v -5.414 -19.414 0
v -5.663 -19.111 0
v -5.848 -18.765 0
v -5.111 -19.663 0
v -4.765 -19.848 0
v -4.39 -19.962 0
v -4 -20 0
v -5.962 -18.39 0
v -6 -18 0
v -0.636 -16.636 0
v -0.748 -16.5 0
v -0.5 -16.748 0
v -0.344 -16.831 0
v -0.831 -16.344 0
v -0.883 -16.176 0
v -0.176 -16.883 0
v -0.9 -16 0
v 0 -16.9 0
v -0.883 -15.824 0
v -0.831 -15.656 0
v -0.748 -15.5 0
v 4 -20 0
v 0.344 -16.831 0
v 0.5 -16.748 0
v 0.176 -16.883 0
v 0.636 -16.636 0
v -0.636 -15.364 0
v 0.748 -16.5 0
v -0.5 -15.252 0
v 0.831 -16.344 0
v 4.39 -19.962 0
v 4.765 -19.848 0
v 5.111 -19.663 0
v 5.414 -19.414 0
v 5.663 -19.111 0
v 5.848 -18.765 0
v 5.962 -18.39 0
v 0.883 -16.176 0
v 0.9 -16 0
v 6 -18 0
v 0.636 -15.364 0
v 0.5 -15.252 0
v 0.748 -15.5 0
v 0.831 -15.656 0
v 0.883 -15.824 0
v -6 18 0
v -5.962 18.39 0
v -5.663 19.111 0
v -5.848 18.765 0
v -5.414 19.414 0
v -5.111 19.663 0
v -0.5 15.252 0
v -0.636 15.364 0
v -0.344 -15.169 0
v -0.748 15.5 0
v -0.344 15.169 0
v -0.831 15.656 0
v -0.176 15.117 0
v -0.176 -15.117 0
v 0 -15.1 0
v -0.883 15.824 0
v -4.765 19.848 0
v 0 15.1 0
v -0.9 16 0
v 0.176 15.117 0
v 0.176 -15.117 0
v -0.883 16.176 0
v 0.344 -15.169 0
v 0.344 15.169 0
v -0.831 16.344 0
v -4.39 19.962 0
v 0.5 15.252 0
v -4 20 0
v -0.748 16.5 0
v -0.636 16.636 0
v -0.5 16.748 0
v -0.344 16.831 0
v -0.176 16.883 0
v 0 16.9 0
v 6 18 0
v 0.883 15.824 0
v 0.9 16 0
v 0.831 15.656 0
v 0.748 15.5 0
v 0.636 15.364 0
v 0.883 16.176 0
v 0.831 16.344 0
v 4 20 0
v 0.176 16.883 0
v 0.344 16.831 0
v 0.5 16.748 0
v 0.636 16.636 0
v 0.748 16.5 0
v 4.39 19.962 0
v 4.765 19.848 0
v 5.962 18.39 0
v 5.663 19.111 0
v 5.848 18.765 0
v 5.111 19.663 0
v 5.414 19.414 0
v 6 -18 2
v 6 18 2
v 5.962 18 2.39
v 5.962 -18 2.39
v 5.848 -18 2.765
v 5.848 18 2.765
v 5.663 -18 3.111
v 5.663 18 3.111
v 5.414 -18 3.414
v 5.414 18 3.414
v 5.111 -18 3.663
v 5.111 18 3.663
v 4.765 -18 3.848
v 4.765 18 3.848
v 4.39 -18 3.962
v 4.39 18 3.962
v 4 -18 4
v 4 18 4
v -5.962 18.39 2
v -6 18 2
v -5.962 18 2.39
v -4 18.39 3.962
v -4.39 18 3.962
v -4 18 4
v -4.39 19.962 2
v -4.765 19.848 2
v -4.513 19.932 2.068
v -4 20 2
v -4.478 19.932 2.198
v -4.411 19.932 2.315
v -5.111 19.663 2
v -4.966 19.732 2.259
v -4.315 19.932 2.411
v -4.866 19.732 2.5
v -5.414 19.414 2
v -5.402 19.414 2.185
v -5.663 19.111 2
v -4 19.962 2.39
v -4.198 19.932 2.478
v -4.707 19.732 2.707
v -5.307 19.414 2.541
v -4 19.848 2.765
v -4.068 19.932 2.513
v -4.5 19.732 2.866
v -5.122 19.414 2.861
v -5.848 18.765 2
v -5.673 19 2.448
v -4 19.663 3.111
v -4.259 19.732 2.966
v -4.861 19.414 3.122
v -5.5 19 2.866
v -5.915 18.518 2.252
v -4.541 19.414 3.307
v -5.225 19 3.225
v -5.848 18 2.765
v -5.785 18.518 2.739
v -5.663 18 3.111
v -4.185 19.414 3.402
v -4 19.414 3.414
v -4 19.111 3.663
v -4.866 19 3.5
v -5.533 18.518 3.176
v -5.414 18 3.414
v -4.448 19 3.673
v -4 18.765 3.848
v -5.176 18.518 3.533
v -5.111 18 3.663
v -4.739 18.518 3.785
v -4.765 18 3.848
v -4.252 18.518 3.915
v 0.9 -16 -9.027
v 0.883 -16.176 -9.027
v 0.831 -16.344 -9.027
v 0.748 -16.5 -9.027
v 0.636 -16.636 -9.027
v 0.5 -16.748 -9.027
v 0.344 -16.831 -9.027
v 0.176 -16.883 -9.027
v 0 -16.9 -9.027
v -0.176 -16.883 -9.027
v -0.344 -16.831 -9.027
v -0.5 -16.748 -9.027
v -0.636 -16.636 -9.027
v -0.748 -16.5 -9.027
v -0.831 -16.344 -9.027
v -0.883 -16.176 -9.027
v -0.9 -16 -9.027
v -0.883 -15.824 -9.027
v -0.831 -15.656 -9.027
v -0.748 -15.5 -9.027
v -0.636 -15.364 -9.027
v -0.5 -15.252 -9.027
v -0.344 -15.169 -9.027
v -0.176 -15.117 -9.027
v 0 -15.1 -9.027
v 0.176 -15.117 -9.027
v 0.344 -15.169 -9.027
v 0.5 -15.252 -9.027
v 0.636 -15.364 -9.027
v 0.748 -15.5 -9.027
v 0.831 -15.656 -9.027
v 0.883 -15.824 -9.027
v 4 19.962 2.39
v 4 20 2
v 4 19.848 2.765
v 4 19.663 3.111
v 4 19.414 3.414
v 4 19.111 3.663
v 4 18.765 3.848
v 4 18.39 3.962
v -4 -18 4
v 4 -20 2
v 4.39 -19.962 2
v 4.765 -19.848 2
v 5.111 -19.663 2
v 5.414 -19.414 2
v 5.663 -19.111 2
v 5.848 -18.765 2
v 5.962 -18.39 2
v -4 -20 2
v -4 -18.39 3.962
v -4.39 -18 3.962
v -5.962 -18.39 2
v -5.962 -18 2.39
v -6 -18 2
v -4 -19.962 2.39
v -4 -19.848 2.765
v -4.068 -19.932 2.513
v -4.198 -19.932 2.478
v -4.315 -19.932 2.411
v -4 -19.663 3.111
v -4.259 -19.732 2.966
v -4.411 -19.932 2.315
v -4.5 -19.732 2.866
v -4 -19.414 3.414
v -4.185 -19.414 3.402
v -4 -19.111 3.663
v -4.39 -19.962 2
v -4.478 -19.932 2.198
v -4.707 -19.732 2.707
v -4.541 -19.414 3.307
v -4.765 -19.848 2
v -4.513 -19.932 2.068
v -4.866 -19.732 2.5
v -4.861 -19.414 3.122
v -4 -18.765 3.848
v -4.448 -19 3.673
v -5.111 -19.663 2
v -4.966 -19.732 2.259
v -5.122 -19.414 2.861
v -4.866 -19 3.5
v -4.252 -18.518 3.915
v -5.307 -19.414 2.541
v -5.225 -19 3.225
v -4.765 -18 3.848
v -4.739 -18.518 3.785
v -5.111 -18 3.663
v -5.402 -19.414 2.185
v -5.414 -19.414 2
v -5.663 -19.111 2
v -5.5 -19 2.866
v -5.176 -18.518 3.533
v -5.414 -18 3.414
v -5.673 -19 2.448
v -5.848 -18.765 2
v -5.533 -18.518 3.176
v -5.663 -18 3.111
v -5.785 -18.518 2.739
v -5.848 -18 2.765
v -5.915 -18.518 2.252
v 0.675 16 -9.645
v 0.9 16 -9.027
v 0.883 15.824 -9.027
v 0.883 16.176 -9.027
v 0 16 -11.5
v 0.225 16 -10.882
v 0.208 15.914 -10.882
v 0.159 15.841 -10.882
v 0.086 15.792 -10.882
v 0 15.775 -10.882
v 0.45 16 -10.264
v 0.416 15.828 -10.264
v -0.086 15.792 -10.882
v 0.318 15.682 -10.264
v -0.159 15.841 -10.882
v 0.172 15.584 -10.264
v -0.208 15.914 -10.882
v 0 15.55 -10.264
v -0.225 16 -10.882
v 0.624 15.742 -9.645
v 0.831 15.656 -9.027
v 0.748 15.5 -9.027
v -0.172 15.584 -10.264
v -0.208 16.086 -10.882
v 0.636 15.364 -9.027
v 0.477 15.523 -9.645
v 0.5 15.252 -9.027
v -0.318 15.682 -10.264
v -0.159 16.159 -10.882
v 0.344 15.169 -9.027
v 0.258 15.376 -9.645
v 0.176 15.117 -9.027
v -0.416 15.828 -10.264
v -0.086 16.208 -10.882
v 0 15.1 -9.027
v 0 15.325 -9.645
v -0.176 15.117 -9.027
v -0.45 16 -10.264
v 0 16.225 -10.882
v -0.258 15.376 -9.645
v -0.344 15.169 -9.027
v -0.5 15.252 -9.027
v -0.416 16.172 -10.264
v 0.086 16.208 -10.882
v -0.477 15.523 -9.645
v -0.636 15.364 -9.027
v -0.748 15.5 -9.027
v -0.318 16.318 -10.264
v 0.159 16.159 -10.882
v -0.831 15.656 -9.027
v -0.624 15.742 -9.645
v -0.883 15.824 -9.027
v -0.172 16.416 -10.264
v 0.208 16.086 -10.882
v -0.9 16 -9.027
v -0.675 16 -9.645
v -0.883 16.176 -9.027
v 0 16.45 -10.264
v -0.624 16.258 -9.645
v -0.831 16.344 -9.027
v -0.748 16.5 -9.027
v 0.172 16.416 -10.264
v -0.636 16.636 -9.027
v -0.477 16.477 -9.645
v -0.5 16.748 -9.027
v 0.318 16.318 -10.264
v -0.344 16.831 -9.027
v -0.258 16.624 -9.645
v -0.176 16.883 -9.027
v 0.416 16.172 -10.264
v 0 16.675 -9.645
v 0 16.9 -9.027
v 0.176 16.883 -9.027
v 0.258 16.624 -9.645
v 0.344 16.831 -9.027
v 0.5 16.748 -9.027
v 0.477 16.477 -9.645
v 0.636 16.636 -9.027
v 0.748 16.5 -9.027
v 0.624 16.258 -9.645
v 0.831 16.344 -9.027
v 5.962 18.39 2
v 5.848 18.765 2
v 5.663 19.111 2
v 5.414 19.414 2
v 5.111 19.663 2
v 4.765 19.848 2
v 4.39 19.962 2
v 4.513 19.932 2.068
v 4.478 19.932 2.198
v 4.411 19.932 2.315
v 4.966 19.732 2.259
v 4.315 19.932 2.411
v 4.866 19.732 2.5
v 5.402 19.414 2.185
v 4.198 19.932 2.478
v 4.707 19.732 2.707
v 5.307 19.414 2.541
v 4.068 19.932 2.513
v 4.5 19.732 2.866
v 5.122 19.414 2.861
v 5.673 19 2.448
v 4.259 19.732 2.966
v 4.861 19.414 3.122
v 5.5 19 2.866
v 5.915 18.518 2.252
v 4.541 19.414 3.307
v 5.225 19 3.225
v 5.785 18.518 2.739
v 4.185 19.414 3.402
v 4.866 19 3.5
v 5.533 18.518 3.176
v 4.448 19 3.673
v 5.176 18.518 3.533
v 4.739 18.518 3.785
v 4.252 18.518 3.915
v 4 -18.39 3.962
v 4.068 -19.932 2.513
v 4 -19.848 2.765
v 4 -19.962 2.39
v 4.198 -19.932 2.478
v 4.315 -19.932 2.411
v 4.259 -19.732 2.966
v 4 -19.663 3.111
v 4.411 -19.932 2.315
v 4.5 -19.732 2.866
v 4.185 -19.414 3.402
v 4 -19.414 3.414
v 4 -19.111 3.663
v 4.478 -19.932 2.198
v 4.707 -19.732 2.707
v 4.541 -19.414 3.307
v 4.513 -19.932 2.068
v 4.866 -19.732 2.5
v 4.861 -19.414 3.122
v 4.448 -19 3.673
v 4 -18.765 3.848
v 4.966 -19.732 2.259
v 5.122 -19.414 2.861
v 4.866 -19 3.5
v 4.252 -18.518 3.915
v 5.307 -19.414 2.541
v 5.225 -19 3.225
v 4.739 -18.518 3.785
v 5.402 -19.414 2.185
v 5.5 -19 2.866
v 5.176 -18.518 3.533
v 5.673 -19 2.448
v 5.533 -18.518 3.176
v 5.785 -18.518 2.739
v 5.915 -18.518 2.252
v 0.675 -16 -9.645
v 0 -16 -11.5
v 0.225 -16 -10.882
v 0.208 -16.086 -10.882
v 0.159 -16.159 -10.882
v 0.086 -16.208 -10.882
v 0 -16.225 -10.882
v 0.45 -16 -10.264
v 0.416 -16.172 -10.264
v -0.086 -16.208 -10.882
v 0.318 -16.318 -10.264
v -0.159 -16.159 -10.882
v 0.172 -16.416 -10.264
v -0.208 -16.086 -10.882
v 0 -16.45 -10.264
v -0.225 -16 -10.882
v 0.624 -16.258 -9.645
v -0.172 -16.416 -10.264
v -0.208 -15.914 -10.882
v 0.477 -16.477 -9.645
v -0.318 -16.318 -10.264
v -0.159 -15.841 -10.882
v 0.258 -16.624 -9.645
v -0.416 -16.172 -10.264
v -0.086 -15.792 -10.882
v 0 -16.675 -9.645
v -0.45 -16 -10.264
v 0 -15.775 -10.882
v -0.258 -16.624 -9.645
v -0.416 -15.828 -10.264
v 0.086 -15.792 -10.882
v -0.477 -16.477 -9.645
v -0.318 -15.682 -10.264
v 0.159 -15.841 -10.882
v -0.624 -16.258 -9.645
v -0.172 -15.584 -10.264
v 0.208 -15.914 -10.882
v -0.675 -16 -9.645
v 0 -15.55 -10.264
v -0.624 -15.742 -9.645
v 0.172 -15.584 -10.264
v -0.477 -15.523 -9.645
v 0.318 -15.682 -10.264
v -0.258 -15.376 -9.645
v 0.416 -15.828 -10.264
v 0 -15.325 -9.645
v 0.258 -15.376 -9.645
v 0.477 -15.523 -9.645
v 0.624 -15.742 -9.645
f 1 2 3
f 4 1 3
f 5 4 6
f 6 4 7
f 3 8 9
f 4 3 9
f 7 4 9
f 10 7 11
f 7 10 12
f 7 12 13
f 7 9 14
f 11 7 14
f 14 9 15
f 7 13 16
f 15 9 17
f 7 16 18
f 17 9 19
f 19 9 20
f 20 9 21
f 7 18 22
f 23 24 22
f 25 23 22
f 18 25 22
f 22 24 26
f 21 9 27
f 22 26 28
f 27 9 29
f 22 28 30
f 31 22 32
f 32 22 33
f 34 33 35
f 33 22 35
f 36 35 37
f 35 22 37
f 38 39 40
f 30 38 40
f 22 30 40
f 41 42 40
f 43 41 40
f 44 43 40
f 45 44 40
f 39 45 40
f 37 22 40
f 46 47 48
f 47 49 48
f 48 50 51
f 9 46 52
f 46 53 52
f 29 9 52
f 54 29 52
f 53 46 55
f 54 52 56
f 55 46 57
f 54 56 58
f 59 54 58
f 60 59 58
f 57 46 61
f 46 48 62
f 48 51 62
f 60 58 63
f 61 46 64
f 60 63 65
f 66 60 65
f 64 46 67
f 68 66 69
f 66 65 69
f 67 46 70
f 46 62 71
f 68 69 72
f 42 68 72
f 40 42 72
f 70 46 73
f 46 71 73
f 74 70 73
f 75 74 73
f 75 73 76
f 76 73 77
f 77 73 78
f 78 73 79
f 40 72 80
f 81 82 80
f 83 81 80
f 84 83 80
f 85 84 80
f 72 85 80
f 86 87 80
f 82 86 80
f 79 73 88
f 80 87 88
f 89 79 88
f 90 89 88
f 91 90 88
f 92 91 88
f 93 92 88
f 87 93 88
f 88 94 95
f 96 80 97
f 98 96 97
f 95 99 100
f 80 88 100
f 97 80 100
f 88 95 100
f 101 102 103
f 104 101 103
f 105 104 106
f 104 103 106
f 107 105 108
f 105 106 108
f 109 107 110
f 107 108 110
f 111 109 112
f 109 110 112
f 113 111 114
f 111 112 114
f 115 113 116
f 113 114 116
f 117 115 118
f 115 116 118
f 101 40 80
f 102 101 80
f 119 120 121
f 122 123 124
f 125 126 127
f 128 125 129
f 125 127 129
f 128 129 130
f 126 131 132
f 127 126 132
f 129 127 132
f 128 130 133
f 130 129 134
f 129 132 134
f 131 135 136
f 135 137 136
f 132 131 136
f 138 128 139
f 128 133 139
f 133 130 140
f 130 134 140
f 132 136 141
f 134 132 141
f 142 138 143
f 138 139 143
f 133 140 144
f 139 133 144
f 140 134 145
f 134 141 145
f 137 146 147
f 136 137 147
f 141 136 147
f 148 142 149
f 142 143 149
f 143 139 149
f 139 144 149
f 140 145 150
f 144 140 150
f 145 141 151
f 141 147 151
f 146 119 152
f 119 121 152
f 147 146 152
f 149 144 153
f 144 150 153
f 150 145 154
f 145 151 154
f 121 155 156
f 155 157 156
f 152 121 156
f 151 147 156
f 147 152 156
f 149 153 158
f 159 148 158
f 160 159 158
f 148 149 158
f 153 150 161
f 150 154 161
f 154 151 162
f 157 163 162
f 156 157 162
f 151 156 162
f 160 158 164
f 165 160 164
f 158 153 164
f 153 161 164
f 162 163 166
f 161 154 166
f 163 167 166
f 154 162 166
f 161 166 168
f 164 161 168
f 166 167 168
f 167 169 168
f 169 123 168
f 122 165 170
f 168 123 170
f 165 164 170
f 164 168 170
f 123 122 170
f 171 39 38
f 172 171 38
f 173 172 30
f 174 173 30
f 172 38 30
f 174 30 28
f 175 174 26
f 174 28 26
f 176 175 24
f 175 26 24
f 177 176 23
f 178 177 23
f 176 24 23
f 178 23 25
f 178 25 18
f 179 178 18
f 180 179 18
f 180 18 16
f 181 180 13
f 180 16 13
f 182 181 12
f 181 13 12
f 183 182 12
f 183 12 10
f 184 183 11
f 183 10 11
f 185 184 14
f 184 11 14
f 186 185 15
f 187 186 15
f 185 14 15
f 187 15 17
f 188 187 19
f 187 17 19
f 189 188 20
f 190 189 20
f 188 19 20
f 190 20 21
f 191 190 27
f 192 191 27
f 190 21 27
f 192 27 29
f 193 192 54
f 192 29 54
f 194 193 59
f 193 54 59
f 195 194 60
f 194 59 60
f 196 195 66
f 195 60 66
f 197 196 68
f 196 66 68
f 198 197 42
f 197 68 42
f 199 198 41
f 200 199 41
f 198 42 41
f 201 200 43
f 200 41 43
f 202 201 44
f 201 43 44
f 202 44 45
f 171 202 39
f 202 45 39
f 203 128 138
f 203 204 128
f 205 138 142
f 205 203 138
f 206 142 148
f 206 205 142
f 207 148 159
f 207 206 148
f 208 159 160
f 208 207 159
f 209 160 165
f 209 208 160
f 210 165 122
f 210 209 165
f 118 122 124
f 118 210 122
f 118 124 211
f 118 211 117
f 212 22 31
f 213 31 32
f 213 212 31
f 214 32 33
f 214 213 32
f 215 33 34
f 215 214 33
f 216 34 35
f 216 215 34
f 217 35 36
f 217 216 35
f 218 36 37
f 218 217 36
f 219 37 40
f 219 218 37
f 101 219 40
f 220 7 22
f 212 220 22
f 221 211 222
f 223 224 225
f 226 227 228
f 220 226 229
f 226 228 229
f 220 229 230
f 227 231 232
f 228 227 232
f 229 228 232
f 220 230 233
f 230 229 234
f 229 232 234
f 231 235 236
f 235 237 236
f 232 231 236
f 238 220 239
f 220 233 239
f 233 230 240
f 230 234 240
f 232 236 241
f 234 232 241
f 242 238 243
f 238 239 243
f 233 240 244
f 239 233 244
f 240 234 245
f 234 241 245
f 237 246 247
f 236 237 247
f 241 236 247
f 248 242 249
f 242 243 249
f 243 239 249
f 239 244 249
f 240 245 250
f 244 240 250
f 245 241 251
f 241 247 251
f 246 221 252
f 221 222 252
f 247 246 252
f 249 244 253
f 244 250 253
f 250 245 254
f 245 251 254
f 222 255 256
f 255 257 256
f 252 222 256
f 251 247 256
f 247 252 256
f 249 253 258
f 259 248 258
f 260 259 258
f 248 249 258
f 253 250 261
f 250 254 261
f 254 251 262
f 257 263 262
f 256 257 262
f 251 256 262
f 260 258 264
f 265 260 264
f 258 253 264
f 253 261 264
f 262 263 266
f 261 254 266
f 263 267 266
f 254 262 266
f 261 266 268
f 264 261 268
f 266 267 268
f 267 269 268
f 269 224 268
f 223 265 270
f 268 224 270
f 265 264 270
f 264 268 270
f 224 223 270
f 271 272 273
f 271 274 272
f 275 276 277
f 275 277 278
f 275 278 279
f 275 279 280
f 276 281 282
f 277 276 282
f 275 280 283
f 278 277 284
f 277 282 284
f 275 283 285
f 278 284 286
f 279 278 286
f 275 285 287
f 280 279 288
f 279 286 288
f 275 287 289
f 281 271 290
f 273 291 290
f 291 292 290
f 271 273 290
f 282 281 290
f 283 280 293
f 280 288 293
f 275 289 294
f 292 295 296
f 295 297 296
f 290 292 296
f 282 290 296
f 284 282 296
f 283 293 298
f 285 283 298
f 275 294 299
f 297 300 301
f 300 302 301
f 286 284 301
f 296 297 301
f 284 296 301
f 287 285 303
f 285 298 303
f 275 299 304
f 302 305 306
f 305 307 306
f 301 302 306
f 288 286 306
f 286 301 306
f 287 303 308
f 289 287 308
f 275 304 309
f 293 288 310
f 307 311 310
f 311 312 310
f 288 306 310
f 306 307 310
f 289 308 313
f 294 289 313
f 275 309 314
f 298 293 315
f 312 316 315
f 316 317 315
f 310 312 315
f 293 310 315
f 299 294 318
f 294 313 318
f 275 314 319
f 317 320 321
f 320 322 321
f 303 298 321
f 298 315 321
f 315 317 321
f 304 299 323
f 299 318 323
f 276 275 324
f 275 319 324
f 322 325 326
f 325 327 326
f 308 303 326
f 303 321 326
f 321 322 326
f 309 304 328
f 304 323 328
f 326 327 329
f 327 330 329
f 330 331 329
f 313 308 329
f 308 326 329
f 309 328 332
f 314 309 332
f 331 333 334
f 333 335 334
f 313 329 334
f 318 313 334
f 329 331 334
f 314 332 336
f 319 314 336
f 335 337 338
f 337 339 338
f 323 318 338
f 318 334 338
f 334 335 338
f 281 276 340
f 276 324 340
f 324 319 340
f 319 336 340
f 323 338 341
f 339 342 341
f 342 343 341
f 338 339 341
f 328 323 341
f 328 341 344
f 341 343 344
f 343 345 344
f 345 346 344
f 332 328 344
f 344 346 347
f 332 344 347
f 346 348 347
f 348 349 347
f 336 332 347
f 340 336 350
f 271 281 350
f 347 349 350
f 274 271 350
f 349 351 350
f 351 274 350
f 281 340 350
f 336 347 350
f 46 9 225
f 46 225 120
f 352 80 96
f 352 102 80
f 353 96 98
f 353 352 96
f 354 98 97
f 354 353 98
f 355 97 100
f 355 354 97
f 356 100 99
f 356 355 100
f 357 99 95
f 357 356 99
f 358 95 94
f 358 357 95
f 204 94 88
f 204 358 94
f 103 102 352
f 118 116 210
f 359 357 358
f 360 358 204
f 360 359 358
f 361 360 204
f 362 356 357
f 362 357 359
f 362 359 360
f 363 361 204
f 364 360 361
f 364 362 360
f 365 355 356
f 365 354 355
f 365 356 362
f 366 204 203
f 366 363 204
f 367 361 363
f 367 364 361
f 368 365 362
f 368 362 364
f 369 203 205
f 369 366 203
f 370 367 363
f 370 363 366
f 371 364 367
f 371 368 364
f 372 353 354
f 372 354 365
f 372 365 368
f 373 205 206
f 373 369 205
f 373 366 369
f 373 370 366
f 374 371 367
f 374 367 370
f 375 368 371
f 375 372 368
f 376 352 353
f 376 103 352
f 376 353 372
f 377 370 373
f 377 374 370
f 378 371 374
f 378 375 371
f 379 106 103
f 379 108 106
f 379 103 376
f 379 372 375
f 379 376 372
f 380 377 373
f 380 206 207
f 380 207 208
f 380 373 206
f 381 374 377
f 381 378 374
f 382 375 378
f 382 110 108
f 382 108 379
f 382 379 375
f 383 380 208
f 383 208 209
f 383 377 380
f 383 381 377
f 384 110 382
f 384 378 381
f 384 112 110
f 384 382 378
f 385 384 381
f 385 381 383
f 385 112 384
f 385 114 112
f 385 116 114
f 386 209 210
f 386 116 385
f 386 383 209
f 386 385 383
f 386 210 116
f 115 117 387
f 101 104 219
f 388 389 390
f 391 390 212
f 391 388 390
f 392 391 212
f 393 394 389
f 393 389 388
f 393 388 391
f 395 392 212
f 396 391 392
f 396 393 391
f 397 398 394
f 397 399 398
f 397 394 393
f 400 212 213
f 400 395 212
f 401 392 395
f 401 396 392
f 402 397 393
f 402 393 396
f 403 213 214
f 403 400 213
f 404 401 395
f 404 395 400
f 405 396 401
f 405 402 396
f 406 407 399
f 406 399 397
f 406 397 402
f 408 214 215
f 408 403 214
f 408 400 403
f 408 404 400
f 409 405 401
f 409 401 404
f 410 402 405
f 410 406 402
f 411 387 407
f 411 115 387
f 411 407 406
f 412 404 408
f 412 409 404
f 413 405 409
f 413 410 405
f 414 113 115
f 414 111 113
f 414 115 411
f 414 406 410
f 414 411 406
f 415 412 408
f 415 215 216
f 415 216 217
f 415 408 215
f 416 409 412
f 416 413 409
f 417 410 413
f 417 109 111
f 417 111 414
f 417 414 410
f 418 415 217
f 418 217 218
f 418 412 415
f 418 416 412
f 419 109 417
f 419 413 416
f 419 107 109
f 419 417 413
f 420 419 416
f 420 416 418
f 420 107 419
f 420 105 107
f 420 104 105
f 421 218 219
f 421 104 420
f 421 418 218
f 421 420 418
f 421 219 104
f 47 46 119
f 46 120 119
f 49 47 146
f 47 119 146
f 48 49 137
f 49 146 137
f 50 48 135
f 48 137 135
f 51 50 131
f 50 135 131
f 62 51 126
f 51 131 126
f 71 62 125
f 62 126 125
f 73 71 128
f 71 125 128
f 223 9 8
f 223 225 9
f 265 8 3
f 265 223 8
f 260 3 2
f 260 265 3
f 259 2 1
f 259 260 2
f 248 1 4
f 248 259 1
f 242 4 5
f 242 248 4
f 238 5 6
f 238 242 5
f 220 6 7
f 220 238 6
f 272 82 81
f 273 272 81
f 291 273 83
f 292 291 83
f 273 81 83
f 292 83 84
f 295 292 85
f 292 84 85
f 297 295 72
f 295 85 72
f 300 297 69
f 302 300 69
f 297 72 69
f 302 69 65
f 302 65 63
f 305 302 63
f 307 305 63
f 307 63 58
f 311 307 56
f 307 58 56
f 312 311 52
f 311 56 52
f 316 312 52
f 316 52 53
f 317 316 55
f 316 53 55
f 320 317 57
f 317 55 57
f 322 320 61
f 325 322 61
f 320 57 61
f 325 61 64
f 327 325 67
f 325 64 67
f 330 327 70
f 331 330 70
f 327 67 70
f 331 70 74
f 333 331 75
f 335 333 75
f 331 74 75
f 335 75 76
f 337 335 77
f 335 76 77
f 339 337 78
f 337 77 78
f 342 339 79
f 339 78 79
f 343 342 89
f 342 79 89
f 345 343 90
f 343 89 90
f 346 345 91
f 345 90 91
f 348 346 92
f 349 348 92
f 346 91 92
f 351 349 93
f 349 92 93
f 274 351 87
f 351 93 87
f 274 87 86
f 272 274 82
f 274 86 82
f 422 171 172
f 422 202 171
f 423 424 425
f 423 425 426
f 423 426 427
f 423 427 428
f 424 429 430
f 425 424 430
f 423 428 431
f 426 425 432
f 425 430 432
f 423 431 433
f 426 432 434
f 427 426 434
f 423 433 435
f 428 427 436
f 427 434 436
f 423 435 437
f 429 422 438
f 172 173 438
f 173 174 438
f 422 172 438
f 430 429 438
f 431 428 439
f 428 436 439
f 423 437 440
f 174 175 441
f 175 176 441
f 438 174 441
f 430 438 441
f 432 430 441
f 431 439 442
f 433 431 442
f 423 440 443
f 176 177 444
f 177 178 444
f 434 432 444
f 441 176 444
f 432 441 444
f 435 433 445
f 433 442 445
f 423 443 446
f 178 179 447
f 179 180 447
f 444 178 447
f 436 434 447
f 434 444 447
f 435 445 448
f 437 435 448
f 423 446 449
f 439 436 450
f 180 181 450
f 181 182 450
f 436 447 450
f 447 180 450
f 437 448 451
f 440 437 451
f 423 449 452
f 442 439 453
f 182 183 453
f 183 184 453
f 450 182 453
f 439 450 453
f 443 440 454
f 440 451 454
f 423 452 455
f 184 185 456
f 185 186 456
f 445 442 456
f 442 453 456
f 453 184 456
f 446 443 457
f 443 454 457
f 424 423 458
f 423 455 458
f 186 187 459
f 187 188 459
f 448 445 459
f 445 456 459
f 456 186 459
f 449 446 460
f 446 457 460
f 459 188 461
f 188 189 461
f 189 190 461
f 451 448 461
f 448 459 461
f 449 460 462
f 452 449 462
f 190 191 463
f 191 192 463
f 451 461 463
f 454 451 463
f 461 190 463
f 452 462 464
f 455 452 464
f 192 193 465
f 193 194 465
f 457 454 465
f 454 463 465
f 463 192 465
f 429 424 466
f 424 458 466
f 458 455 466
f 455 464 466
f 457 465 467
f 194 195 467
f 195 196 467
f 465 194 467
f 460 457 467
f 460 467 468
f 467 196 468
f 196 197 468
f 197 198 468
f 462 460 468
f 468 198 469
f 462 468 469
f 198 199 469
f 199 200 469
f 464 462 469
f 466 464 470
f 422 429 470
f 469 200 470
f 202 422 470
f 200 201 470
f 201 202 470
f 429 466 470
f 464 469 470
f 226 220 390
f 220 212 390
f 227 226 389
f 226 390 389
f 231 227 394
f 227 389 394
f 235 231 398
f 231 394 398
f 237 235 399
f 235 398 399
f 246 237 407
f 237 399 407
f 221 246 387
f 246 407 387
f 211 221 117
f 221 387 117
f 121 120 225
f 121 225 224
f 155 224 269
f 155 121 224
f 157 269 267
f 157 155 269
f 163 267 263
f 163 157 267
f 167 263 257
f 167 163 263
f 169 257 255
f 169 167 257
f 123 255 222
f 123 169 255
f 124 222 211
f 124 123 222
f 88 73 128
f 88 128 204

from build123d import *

# Parameters (mm, degrees)
F3_W       = 12
F3_H       = 40
F4_DEPTH   = 4
F5_R       = 2
F6_R       = 0.9
F7_DEPTH   = 11.5
F8_SIZE2   = 2.4727296775
F8_SIZE    = 0.9
F8_2_SIZE2 = 2.4727296775
F8_2_SIZE  = 0.9


with BuildPart() as f4:
    # F3 (on Top) → F4 (new body)
    with BuildSketch(Plane.XY):
        Rectangle(F3_W, F3_H)
    extrude(amount=F4_DEPTH)

    # F5
    f5_edges = [f4.edges().sort_by_distance(p)[0] for p in [
        (6, 0, 4),
        (-6, 0, 4),
        (0, -20, 4),
        (6, -20, 2),
        (-6, 20, 2),
        (6, 20, 2),
        (0, 20, 4),
        (-6, -20, 2),
    ]]
    fillet(f5_edges, radius=F5_R)

    # F6 (on face) → F7 (join)
    with BuildSketch(Plane(origin=(0, 0, 0), x_dir=(1, 0, 0), z_dir=(0, 0, -1))):
        with Locations((0, -16)):
            Circle(F6_R)
        with Locations((0, 16)):
            Circle(F6_R)
    extrude(amount=F7_DEPTH)

    # F8
    f8_edges = [f4.edges().sort_by_distance(p)[0] for p in [
        (-0.9, 16, -11.5),
    ]]
    f8_side = f4.faces().sort_by_distance((0, 16, -11.5))[0]
    chamfer(f8_edges, length=F8_SIZE, length2=F8_SIZE2, reference=f8_side)

    # F8#2
    f8_2_edges = [f4.edges().sort_by_distance(p)[0] for p in [
        (-0.9, -16, -11.5),
    ]]
    f8_2_side = f4.faces().sort_by_distance((0, -16, -11.5))[0]
    chamfer(f8_2_edges, length=F8_2_SIZE, length2=F8_2_SIZE2, reference=f8_2_side)


solid = f4.part
